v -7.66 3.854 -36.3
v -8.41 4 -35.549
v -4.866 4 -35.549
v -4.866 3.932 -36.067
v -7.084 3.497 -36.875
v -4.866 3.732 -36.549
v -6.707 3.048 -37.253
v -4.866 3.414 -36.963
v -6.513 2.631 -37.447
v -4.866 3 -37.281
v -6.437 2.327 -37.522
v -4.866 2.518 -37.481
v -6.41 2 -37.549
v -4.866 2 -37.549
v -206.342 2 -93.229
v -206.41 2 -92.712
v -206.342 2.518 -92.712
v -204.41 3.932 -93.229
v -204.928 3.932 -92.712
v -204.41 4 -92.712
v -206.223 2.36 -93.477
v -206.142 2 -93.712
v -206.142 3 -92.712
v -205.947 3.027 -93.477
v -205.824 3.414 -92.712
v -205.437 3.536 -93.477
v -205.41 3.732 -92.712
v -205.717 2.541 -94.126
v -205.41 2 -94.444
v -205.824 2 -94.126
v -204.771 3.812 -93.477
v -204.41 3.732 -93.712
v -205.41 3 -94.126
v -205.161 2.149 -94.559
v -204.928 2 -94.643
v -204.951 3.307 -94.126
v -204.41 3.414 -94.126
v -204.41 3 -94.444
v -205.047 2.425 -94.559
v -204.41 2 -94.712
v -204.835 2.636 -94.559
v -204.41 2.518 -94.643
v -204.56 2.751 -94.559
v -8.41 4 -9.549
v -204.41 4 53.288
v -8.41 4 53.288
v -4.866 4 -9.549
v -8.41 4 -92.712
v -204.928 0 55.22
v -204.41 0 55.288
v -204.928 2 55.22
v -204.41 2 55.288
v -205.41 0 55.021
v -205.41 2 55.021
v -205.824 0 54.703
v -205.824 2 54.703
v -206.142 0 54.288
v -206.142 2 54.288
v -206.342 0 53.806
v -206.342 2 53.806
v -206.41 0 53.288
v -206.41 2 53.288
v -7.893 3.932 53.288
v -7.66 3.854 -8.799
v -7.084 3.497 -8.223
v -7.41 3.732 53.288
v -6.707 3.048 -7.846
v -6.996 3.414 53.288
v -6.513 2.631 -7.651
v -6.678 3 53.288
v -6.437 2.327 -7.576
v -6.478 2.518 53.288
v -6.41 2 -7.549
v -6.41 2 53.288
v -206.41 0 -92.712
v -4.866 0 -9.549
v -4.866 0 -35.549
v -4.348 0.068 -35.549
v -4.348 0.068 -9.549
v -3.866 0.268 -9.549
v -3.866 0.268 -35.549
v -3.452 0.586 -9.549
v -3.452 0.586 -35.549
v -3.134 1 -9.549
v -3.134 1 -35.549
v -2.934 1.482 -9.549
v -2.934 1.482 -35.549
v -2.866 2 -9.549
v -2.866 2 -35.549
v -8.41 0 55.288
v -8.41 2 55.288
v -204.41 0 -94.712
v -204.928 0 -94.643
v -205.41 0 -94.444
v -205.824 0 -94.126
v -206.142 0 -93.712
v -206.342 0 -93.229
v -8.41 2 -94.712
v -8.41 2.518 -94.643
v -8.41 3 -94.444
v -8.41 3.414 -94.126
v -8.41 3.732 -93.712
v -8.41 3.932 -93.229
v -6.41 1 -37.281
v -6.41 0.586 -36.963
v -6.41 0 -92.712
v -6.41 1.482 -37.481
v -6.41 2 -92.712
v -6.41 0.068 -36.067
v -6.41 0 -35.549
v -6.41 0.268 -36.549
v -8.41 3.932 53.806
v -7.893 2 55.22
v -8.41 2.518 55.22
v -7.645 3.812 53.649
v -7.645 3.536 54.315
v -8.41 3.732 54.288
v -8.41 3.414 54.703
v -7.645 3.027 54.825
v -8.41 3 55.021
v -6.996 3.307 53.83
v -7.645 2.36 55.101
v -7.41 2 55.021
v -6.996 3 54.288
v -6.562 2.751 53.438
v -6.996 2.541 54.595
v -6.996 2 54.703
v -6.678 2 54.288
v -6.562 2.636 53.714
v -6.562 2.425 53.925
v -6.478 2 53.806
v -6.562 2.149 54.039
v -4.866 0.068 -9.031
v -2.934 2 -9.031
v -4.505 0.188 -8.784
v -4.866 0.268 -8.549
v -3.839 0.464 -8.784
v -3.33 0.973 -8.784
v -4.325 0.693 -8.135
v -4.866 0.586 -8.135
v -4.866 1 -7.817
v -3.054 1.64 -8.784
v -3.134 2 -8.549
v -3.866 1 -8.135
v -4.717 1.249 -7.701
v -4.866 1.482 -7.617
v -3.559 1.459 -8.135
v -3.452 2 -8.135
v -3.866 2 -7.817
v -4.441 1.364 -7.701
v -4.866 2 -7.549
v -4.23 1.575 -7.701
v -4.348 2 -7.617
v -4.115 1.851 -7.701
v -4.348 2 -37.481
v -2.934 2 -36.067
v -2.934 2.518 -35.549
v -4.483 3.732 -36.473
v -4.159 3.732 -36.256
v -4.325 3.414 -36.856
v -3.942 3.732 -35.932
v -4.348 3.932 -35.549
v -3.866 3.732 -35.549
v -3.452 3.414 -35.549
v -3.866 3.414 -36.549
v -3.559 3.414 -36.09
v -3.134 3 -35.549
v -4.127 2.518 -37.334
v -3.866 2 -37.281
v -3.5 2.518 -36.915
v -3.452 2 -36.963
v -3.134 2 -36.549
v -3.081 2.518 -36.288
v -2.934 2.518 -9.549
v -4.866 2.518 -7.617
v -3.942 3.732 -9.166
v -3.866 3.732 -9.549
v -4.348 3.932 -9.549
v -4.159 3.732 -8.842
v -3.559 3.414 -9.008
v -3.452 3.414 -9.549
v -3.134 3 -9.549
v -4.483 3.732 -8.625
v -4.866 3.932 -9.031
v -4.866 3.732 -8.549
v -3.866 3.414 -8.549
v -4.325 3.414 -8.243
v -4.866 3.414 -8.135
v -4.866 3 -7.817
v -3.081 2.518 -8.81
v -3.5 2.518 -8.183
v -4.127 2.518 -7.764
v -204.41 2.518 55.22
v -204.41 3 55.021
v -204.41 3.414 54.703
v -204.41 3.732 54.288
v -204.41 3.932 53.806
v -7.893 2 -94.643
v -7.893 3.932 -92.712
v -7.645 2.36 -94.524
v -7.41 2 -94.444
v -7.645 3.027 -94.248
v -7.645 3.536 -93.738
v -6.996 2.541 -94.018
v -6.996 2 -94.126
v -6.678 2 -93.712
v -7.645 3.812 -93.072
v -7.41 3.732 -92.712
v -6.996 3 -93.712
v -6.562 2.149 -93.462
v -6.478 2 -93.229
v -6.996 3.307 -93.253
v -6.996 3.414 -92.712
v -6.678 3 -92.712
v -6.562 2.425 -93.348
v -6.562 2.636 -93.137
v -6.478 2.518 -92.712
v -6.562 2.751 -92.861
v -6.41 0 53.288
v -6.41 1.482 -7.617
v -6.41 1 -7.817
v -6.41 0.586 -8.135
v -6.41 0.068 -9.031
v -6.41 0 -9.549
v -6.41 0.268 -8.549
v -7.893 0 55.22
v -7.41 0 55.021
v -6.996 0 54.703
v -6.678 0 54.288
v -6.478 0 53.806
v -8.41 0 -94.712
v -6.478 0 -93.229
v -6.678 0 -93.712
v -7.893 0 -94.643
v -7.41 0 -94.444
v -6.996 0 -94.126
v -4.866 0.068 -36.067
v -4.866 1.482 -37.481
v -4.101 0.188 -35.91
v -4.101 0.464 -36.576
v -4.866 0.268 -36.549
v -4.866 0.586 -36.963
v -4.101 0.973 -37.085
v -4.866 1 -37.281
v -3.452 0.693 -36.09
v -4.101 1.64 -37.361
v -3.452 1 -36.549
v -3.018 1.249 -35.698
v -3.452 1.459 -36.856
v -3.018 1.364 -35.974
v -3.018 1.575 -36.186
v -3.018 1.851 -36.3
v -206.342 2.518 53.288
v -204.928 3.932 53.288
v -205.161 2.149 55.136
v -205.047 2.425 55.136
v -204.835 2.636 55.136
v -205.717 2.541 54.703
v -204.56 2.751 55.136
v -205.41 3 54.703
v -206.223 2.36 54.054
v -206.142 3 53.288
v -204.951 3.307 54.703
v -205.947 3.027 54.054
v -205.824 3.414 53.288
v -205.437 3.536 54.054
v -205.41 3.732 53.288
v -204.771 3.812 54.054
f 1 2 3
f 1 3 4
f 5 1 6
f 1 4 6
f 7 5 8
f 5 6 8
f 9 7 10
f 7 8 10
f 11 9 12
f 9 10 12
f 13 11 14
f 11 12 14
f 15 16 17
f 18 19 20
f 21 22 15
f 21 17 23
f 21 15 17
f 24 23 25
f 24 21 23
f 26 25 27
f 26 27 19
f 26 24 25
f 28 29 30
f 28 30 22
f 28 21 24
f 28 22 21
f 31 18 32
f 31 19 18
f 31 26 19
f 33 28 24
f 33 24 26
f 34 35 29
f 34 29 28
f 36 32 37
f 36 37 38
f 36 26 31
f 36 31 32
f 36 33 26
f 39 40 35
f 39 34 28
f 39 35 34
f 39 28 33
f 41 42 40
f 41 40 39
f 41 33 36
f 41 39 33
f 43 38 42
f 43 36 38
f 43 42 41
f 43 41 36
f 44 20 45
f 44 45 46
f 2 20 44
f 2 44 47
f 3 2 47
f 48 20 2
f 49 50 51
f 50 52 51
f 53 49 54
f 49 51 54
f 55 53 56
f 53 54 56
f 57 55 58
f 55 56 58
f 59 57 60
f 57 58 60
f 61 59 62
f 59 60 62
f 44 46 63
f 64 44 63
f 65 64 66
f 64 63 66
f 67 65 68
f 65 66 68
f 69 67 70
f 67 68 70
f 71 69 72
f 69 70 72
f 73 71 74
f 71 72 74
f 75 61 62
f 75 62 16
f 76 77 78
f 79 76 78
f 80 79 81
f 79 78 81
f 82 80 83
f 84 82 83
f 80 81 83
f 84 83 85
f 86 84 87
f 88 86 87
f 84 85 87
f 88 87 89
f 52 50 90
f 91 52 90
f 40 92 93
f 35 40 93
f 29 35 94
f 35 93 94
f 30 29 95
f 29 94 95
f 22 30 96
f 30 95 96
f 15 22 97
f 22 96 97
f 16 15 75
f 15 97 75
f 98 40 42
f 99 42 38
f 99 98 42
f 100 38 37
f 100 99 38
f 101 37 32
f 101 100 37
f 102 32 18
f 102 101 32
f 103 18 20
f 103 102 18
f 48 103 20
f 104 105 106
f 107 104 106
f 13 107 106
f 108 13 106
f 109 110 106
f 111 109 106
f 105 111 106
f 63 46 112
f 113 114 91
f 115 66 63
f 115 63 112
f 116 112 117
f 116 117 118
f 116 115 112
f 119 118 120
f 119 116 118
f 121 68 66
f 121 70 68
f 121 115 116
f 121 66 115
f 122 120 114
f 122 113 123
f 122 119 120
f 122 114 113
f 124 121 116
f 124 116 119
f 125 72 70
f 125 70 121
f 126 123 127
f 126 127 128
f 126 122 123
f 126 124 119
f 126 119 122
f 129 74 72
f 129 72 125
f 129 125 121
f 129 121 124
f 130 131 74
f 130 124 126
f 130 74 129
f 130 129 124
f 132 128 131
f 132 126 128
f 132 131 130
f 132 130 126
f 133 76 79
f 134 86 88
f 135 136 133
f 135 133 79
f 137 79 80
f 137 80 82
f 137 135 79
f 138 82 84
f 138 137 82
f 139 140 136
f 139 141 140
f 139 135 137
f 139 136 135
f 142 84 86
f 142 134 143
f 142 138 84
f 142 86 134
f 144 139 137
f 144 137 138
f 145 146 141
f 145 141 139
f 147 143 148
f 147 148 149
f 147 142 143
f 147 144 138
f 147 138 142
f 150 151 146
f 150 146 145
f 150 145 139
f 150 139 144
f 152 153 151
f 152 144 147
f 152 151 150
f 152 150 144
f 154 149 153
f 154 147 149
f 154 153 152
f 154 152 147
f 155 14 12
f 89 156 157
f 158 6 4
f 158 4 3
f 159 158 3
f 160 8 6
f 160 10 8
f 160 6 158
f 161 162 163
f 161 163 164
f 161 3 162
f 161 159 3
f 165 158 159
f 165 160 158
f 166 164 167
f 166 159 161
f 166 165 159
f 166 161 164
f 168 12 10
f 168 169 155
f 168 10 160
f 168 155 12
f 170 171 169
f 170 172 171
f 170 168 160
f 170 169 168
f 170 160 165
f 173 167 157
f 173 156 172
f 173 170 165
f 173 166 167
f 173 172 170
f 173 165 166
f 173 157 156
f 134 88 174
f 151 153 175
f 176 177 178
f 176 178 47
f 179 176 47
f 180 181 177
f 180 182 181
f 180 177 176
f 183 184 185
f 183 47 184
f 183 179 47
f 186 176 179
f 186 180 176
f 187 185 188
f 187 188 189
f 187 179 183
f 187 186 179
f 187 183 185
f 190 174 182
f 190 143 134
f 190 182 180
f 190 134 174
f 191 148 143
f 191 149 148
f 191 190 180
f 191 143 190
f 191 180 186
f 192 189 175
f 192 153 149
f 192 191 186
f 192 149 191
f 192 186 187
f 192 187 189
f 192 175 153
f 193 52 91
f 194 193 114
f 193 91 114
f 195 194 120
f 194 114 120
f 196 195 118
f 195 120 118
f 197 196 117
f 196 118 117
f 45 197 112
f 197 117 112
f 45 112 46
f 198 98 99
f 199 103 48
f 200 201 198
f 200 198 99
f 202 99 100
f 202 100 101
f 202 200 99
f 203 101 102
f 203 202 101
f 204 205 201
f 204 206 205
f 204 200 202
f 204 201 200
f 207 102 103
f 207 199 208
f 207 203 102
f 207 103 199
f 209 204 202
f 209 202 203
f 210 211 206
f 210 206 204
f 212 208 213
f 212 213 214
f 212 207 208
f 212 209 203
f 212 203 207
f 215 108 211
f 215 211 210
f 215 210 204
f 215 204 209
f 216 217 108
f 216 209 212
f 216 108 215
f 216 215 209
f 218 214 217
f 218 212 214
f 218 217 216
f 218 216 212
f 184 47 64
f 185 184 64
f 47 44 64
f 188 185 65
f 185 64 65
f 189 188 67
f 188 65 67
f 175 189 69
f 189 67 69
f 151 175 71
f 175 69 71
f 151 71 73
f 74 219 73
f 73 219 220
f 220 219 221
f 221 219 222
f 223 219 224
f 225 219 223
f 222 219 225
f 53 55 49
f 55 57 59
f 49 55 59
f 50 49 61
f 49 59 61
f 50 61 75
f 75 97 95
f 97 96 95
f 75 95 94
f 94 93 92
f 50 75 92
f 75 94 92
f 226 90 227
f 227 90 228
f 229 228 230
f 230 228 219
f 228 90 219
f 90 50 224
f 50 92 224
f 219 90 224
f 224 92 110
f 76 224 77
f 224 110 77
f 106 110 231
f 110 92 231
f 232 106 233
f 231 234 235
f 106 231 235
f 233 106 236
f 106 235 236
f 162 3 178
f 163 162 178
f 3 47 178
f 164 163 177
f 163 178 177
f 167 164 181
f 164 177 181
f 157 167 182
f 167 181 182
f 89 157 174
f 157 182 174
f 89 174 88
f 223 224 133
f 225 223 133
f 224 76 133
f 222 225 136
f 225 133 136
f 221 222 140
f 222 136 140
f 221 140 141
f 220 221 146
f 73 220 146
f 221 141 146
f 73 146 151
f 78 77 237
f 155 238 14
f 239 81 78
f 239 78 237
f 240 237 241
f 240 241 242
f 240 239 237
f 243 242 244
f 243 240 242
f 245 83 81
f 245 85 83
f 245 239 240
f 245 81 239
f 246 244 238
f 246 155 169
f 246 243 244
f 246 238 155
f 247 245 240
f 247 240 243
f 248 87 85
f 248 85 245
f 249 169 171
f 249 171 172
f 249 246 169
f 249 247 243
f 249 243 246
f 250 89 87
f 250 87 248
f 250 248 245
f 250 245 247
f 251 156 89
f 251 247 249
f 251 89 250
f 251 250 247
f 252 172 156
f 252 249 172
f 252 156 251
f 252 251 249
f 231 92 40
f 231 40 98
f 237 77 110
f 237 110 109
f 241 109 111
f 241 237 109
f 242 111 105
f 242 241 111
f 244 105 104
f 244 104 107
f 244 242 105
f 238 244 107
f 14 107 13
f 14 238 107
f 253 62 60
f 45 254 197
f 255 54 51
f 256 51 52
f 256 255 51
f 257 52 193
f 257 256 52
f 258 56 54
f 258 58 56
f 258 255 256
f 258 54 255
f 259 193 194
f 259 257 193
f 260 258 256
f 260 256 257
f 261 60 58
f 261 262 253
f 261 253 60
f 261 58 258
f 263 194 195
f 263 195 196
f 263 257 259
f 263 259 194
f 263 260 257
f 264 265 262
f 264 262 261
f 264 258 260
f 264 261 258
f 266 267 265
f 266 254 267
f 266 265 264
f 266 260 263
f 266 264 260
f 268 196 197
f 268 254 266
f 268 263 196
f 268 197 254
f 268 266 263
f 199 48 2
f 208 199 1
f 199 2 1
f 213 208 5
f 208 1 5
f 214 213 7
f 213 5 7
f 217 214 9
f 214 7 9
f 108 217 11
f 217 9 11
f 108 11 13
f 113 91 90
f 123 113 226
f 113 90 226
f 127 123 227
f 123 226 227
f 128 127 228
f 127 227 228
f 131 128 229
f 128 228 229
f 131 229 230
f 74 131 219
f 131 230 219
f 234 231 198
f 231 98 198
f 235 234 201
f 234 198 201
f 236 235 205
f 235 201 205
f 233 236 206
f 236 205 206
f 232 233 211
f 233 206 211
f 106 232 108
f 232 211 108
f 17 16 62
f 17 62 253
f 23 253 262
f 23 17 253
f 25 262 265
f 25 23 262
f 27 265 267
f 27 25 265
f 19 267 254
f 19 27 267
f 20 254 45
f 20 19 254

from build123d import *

# Parameters (mm, degrees)
SKETCH1_W           = 200
SKETCH1_H           = 150
BOSS_EXTRUDE1_DEPTH = 4
FILLET1_R           = 2
FILLET2_R           = 2
FILLET3_R           = 2
FILLET4_R           = 2
SKETCH2_W           = 8
SKETCH2_H           = 30
BOSS_EXTRUDE2_DEPTH = 4
FILLET5_R           = 2


# Some blends are built 0.0001 mm under size
with BuildPart() as part:
    # Sketch1 → Boss-Extrude1 (new body)
    with BuildSketch(Plane(origin=(0, 0, 0), x_dir=(1, 0, 0), z_dir=(0, 1, 0))):
        with Locations((-106.41025641, 19.711538462)):
            Rectangle(SKETCH1_W, SKETCH1_H)
    extrude(amount=BOSS_EXTRUDE1_DEPTH)

    # Fillet1
    fillet1_edges = [part.edges().sort_by_distance(p)[0] for p in [
        (-206.41025641, 4, -19.711538462),
        (-106.41025641, 4, -94.711538462),
    ]]
    fillet(fillet1_edges, radius=FILLET1_R)

    # Fillet2
    fillet2_edges = [part.edges().sort_by_distance(p)[0] for p in [
        (-105.41025641, 4, 55.288461538),
        (-206.41025641, 1, 55.288461538),
        (-205.824469973, 3.414213562, 55.288461538),
    ]]
    fillet(fillet2_edges, radius=FILLET2_R)

    # Fillet3
    fillet3_edges = [part.edges().sort_by_distance(p)[0] for p in [
        (-6.41025641, 1, -94.711538462),
        (-6.41025641, 3.414213562, -94.125752024),
        (-6.41025641, 1, 55.288461538),
        (-6.41025641, 4, -19.711538462),
        (-6.41025641, 3.414213562, 54.702675101),
    ]]
    fillet(fillet3_edges, radius=FILLET3_R)

    # Fillet4
    # the kernel refuses this fillet: 2 mm, written as the material it takes off along each edge
    with BuildSketch(Plane(origin=(-204.41025641, 2, -92.711538462), x_dir=(-1, 0, 0), z_dir=(0, 0, -1))) as fillet4_piece_1_section:
        Polygon((0, 0), (FILLET4_R, 0), (FILLET4_R, FILLET4_R), (0, FILLET4_R), align=None)
    fillet4_piece_1 = extrude(amount=FILLET4_R, mode=Mode.PRIVATE)
    fillet4_piece_1 = fillet4_piece_1 - Plane(origin=(-204.41025641, 2, -92.711538462), x_dir=(0.7071067811865475, -0.7071067811865475, 0), z_dir=(0, 0, -1)) * Sphere(FILLET4_R, mode=Mode.PRIVATE)
    add(fillet4_piece_1, mode=Mode.SUBTRACT)
    with BuildSketch(Plane(origin=(-206.41025641, -5, -94.711538462), x_dir=(1, 0, 0), z_dir=(0, 1, 0))) as fillet4_piece_2:
        with BuildLine():
            CenterArc((FILLET4_R, -FILLET4_R), FILLET4_R, 90, 90)
            Line((0, -FILLET4_R), (0, 0))
            Line((0, 0), (FILLET4_R, 0))
        make_face()
    extrude(amount=7, mode=Mode.SUBTRACT)

    # Sketch2 → Boss-Extrude2 (add)
    with BuildSketch(Plane(origin=(0, 4, 0), x_dir=(1, 0, 0), z_dir=(0, 1, 0))):
        with Locations((-6.865890451, 22.549136896)):
            Rectangle(SKETCH2_W, SKETCH2_H)
    extrude(amount=-BOSS_EXTRUDE2_DEPTH)

    # Fillet5
    fillet5_edges = [part.edges().sort_by_distance(p)[0] for p in [
        (-4.638073431, 0, -37.549136896),
    ]]
    fillet(fillet5_edges, radius=FILLET5_R)
    fillet5_2_edges = [part.edges().sort_by_distance(p)[0] for p in [
        (-2.865890451, 0, -21.549136896),
    ]]
    fillet(fillet5_2_edges, radius=FILLET5_R)
    fillet5_3_edges = [part.edges().sort_by_distance(p)[0] for p in [
        (-5.638073431, 0, -7.549136896),
    ]]
    fillet(fillet5_3_edges, radius=FILLET5_R)
    fillet5_4_edges = [part.edges().sort_by_distance(p)[0] for p in [
        (-6.638073431, 4, -37.549136896),
    ]]
    fillet(fillet5_4_edges, radius=FILLET5_R - 0.0001)  # a hair under: the kernel refuses the full size


solid = part.part
